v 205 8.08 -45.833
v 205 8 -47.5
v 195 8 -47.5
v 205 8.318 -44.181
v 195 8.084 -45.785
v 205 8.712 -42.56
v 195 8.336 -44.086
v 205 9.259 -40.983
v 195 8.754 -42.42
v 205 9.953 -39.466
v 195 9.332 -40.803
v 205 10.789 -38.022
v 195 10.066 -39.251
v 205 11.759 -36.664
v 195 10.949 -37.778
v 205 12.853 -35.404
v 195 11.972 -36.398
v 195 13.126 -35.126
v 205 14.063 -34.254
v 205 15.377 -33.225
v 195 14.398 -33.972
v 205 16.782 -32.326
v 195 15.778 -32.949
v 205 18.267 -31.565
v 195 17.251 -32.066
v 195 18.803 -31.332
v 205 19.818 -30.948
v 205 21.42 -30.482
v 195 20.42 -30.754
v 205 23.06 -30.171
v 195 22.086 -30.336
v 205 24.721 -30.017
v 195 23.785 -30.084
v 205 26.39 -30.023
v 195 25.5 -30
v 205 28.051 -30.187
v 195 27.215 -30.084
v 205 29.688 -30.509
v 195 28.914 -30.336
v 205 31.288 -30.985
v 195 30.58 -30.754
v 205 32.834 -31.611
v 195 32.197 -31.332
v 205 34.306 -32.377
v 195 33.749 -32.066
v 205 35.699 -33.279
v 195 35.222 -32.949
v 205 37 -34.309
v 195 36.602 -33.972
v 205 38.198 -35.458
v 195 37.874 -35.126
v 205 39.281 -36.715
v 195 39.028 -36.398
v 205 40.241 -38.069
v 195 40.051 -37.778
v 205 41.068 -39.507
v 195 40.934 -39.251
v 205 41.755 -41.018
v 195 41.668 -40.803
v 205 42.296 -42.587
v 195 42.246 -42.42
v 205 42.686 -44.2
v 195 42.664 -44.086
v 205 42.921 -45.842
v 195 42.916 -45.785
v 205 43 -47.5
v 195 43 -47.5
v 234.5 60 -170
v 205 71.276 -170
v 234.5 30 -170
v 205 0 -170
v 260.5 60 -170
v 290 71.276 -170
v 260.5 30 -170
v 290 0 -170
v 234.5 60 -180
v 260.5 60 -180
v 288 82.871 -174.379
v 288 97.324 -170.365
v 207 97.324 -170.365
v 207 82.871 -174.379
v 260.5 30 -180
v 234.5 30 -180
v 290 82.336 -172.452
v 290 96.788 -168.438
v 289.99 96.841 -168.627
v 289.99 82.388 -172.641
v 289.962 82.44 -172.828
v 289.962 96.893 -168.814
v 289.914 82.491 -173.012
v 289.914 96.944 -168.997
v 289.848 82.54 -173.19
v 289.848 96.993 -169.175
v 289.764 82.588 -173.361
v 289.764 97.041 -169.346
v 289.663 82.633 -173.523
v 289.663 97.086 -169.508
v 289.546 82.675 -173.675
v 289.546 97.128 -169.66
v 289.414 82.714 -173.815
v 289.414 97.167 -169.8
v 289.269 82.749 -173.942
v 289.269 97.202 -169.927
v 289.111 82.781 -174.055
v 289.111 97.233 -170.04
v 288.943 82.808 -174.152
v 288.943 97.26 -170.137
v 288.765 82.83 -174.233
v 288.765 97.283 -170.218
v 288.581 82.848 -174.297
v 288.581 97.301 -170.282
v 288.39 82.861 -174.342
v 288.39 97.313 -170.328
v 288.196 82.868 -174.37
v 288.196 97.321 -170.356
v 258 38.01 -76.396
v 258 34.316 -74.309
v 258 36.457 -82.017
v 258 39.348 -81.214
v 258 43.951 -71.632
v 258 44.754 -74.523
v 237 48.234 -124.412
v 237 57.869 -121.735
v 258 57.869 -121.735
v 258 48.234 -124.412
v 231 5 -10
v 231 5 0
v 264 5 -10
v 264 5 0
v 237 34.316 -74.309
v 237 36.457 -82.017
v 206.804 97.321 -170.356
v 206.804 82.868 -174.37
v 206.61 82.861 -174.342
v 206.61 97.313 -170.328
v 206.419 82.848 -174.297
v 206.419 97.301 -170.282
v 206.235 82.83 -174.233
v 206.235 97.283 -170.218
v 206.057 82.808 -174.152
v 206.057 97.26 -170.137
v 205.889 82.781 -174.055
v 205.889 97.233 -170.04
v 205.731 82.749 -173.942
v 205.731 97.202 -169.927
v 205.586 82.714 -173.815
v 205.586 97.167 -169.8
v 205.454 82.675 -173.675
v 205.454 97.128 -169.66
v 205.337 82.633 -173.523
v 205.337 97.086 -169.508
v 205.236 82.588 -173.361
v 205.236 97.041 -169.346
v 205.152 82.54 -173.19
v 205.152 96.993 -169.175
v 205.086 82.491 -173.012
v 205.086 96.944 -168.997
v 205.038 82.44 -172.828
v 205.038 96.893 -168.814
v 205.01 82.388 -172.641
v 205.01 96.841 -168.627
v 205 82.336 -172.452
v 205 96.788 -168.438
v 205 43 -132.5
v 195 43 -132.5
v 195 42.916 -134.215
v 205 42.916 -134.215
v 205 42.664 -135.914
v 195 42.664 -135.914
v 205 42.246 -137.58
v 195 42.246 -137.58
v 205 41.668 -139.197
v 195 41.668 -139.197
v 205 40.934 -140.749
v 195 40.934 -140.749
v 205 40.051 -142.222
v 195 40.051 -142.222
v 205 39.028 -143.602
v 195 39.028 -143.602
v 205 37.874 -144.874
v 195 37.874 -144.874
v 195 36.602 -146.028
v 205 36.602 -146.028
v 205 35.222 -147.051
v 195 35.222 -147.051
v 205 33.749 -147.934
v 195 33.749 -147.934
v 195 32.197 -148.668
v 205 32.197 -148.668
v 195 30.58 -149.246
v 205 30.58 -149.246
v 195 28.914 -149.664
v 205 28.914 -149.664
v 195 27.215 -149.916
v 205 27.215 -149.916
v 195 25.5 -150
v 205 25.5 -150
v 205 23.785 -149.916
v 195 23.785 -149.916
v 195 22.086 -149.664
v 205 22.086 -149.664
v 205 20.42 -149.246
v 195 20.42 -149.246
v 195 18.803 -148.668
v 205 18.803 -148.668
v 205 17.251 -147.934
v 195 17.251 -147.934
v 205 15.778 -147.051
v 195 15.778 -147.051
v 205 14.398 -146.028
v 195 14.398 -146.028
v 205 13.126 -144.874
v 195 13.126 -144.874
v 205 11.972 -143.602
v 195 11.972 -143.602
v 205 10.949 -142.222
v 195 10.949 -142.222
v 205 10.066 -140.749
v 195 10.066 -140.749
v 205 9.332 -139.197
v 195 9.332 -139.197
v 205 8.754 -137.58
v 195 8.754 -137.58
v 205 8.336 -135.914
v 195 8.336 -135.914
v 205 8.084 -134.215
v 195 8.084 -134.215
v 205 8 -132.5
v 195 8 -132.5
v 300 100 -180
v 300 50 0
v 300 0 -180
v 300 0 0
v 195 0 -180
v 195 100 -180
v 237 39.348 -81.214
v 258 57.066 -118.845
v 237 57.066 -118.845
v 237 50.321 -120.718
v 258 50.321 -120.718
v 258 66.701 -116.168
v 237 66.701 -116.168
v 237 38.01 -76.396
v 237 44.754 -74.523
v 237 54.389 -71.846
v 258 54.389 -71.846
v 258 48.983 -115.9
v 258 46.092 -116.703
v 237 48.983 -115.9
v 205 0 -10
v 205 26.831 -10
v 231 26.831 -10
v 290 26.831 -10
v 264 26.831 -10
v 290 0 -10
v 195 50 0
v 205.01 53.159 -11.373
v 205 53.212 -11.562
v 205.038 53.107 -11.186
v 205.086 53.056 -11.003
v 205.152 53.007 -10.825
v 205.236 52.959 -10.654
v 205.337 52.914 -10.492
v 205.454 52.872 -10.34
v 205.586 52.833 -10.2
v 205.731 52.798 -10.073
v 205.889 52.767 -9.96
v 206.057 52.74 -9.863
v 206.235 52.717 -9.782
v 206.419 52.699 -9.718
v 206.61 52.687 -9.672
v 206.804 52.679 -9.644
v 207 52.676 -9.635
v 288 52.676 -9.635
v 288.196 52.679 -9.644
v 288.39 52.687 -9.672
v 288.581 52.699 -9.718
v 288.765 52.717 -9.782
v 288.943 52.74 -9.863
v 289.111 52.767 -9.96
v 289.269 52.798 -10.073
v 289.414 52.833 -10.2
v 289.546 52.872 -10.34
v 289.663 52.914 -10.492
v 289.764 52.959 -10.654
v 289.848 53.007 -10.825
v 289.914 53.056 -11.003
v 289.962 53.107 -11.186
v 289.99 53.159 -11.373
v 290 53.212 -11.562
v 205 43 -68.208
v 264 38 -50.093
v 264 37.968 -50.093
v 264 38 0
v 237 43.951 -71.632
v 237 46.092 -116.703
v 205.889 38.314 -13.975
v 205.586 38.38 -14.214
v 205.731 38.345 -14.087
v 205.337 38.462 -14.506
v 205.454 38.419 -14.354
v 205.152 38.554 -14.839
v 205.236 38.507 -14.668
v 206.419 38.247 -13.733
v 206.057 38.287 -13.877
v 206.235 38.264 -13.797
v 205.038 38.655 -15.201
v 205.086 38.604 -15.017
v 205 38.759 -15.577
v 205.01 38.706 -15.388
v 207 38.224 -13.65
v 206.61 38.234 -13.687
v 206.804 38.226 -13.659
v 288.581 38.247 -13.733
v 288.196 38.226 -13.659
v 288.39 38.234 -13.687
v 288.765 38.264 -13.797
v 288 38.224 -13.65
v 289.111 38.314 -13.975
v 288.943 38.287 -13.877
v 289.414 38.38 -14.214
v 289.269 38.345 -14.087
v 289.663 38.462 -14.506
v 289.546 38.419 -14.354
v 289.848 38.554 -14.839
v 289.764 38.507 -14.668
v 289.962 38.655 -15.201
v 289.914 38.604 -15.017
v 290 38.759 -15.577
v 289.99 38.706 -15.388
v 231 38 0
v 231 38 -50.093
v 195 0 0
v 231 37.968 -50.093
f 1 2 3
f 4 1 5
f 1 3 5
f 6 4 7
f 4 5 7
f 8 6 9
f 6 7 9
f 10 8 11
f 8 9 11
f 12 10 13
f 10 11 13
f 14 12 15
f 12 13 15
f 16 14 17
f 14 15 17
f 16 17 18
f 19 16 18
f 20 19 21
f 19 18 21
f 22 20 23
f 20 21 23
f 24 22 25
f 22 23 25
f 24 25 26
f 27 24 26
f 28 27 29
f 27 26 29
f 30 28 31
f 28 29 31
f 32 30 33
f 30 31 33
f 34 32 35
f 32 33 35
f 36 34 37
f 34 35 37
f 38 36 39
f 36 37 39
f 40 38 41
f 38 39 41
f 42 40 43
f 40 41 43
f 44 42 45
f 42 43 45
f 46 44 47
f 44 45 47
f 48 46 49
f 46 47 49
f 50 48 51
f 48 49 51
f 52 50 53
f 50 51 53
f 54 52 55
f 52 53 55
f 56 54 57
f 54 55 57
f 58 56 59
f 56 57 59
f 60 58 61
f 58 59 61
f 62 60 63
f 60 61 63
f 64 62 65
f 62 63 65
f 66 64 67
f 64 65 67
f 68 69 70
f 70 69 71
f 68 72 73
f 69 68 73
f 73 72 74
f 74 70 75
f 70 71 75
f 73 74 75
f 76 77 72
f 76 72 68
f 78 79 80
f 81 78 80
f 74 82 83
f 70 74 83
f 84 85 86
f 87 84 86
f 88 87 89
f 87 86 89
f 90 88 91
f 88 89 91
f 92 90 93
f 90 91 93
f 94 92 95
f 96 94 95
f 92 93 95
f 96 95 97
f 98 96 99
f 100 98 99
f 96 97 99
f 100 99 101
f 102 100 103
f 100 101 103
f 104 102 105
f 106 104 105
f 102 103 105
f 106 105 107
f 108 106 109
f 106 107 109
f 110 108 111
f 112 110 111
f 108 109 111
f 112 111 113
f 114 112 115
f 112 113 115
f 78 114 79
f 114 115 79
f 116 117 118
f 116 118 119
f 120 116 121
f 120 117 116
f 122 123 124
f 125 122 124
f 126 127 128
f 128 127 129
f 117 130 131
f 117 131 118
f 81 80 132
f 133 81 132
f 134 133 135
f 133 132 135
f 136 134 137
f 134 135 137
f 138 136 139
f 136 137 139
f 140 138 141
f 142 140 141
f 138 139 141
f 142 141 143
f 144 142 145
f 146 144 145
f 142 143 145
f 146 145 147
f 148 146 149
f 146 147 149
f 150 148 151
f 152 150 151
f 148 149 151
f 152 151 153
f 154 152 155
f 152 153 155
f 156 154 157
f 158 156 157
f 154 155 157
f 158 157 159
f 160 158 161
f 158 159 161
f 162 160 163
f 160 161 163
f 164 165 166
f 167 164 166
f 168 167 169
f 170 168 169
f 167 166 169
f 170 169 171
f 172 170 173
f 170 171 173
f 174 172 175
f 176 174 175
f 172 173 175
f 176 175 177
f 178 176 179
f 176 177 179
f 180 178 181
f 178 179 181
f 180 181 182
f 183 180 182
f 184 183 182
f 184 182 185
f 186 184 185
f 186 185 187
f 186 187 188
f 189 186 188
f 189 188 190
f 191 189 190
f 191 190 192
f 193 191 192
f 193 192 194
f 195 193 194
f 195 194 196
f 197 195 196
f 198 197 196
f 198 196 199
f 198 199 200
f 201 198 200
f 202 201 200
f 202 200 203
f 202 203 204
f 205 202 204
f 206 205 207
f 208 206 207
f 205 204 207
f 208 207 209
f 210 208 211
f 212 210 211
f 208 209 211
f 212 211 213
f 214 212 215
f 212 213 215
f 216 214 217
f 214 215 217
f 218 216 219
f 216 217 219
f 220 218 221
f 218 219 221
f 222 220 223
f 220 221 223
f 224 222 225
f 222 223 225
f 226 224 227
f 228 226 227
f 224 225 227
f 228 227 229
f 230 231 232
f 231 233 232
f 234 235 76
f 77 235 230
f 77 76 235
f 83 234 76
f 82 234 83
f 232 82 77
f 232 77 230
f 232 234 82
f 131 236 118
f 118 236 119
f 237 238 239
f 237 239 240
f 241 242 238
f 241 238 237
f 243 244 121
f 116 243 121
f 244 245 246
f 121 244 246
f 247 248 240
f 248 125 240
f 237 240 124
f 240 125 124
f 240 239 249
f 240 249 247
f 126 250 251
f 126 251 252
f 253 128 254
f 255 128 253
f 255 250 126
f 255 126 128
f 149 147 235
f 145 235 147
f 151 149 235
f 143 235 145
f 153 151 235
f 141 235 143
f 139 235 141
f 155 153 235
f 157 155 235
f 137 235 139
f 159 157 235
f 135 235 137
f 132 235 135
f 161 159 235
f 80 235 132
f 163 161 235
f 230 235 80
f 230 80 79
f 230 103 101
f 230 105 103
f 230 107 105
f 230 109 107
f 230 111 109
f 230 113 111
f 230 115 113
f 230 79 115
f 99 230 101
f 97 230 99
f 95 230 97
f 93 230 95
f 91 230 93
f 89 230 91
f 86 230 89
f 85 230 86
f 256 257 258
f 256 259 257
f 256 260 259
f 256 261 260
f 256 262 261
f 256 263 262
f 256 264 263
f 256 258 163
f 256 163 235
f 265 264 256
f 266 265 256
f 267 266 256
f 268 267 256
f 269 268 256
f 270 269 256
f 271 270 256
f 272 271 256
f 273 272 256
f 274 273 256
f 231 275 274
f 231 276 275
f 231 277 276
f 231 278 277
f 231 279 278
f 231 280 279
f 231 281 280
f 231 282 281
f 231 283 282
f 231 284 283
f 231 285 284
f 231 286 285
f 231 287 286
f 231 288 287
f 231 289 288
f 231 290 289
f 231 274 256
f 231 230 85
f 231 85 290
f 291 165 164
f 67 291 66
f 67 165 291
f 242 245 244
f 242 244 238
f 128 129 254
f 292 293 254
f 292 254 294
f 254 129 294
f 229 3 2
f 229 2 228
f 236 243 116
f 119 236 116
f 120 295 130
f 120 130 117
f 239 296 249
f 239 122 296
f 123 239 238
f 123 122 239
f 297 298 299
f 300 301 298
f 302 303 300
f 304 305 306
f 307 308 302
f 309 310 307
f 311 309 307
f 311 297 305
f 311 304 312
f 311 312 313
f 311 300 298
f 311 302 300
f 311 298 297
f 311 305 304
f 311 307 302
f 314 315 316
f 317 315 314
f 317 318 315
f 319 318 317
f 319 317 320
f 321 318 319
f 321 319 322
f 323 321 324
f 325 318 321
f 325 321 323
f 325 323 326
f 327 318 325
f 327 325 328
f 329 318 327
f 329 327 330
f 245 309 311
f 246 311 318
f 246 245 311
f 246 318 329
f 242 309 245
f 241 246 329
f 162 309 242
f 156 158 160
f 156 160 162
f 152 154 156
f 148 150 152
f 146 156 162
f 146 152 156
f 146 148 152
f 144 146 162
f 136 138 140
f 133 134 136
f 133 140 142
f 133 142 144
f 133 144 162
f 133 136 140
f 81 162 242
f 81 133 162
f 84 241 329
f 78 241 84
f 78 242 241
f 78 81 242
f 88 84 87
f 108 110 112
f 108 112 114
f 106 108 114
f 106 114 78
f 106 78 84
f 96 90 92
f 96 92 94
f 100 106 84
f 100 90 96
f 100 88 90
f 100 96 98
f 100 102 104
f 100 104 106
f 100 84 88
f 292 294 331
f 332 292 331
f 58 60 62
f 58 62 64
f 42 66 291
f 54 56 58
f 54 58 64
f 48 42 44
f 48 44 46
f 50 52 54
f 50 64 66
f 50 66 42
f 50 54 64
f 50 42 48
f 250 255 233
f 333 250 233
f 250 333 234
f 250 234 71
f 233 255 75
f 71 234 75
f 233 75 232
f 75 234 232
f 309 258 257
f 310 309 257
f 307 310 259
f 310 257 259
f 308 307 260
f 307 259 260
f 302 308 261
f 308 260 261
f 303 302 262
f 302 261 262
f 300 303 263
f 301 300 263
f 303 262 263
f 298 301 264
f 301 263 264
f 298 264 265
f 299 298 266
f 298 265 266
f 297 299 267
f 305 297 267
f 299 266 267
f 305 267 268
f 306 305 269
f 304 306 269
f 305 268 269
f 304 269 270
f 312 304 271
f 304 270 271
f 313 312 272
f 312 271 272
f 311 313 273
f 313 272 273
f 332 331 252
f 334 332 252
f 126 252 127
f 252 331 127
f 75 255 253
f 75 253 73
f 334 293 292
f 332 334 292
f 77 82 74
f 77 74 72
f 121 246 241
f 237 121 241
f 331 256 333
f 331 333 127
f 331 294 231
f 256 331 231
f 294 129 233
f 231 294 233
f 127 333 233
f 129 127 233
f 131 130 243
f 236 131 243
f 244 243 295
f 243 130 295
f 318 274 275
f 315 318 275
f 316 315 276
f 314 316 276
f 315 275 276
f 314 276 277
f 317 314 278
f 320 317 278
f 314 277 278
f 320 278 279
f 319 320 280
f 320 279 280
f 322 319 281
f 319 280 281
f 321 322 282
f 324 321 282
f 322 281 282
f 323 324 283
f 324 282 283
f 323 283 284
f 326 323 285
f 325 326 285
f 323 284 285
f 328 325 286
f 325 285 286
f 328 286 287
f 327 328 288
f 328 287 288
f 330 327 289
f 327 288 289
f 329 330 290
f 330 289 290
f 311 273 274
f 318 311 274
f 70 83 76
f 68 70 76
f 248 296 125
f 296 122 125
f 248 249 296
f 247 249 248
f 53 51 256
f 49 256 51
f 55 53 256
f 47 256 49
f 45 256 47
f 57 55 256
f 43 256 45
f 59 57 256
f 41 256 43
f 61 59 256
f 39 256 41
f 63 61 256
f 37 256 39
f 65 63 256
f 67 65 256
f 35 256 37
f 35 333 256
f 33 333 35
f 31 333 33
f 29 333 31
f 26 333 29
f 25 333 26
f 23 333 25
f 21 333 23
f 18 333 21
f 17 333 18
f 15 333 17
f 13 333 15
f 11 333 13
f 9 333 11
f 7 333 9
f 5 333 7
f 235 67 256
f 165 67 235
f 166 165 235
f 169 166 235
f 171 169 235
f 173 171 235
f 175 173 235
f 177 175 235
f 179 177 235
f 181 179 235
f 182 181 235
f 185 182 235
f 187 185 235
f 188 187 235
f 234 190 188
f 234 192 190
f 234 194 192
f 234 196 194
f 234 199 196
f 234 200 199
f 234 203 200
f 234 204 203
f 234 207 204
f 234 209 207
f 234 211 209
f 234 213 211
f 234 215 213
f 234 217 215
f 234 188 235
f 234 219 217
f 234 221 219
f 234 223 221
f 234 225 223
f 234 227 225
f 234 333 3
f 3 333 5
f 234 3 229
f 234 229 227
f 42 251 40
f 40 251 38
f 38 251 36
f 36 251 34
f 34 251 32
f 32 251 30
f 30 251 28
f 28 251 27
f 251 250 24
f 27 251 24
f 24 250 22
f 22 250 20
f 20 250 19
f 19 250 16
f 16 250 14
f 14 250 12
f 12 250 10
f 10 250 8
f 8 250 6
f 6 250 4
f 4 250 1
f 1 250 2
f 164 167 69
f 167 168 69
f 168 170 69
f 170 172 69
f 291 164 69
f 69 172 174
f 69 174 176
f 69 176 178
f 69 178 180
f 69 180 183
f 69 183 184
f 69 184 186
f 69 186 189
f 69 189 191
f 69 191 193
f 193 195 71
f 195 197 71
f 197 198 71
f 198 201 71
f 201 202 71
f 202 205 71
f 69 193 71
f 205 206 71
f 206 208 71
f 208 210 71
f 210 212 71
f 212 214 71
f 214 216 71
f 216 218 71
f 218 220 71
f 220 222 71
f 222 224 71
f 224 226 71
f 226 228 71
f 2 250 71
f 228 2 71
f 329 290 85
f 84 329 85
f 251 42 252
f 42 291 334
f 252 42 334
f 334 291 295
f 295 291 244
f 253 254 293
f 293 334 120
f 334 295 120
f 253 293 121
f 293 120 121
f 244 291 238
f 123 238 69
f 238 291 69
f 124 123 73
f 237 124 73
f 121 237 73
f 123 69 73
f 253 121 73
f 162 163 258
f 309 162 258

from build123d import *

# Parameters (mm, degrees)
SKETCH2_W            = 300
SKETCH2_H            = 180
BOSS_EXTRUDE1_DEPTH  = 50
CUT_EXTRUDE1_DEPTH   = 15
BOSS_EXTRUDE4_DEPTH  = 50
SKETCH10_W           = 105
SKETCH10_H           = 180
BOSS_EXTRUDE7_DEPTH  = 50
CUT_EXTRUDE3_DEPTH   = 105
CUT_EXTRUDE4_DEPTH   = 15
SKETCH14_W           = 70
SKETCH14_H           = 65
SKETCH14_W_2         = 95
BOSS_EXTRUDE8_DEPTH  = 35
CUT_EXTRUDE5_DEPTH   = 195
SHELL1_T             = -10
SKETCH16_W           = 21
SKETCH16_H           = 46
CUT_EXTRUDE7_DEPTH   = 10
SKETCH17_R           = 17.5
CUT_EXTRUDE15_DEPTH  = 10
CUT_EXTRUDE16_DEPTH  = 10
SKETCH22_W           = 40.092518347
SKETCH22_H           = 11.168807906
CUT_EXTRUDE17_DEPTH  = 33
SKETCH23_W           = 21
SKETCH23_H           = 10
BOSS_EXTRUDE9_DEPTH  = 3
SKETCH24_W           = 21
SKETCH24_H           = 3
BOSS_EXTRUDE10_DEPTH = 5
CUT_EXTRUDE18_DEPTH  = 10
SKETCH27_W           = 26
SKETCH27_H           = 30
CUT_EXTRUDE19_DEPTH  = 10


with BuildPart() as part:
    # Sketch2 → Boss-Extrude1 (new body)
    with BuildSketch(Plane(origin=(0, 0, 0), x_dir=(1, 0, 0), z_dir=(0, 1, 0))):
        with Locations((150, 90)):
            Rectangle(SKETCH2_W, SKETCH2_H)
    extrude(amount=BOSS_EXTRUDE1_DEPTH)

    # Sketch3 → Cut-Extrude1 (cut)
    with BuildSketch(Plane(origin=(0, 50, 0), x_dir=(1, 0, 0), z_dir=(0, 1, 0))):
        with BuildLine():
            Line((90, 12), (90, 73))
            ThreePointArc((90, 73), (90.585786438, 74.414213562), (92, 75))
            Line((92, 75), (183, 75))
            ThreePointArc((183, 75), (184.414213562, 74.414213562), (185, 73))
            Line((185, 73), (185, 12))
            ThreePointArc((185, 12), (184.414213562, 10.585786438), (183, 10))
            Line((183, 10), (92, 10))
            ThreePointArc((92, 10), (90.585786438, 10.585786438), (90, 12))
        make_face()
        with BuildLine():
            Line((12, 10), (78, 10))
            ThreePointArc((78, 10), (79.414213562, 10.585786438), (80, 12))
            Line((80, 12), (80, 73))
            ThreePointArc((80, 73), (79.414213562, 74.414213562), (78, 75))
            Line((78, 75), (12, 75))
            ThreePointArc((12, 75), (10.585786438, 74.414213562), (10, 73))
            Line((10, 73), (10, 12))
            ThreePointArc((10, 12), (10.585786438, 10.585786438), (12, 10))
        make_face()
    extrude(amount=-CUT_EXTRUDE1_DEPTH, mode=Mode.SUBTRACT)

    # Sketch6 → Boss-Extrude4 (add)
    with BuildSketch(Plane(origin=(0, 50, 0), x_dir=(1, 0, 0), z_dir=(0, 1, 0))):
        Polygon((0, 180), (185, 180), (195, 180), (195, 95), (185, 95), (0, 95), align=None)
        with BuildLine():
            Line((185, 168), (185, 107))
            ThreePointArc((185, 107), (184.414213562, 105.585786438), (183, 105))
            Line((183, 105), (92, 105))
            ThreePointArc((92, 105), (90.585786438, 105.585786438), (90, 107))
            Line((90, 107), (90, 168))
            ThreePointArc((90, 168), (90.585786438, 169.414213562), (92, 170))
            Line((92, 170), (183, 170))
            ThreePointArc((183, 170), (184.414213562, 169.414213562), (185, 168))
        make_face(mode=Mode.SUBTRACT)
        with BuildLine():
            Line((80, 107), (80, 168))
            ThreePointArc((80, 168), (79.414213562, 169.414213562), (78, 170))
            Line((78, 170), (12, 170))
            ThreePointArc((12, 170), (10.585786438, 169.414213562), (10, 168))
            Line((10, 168), (10, 107))
            ThreePointArc((10, 107), (10.585786438, 105.585786438), (12, 105))
            Line((12, 105), (78, 105))
            ThreePointArc((78, 105), (79.414213562, 105.585786438), (80, 107))
        make_face(mode=Mode.SUBTRACT)
    extrude(amount=BOSS_EXTRUDE4_DEPTH)

    # Sketch10 → Boss-Extrude7 (add)
    with BuildSketch(Plane(origin=(0, 50, 0), x_dir=(1, 0, 0), z_dir=(0, 1, 0))):
        with Locations((247.5, 90)):
            Rectangle(SKETCH10_W, SKETCH10_H)
    extrude(amount=BOSS_EXTRUDE7_DEPTH)

    # Sketch11 → Cut-Extrude3 (cut)
    with BuildSketch(Plane(origin=(300, 0, 0), x_dir=(0, 0, -1), z_dir=(1, 0, 0))):
        Polygon((0, 100), (180, 100), (0, 50), align=None)
    extrude(amount=-CUT_EXTRUDE3_DEPTH, mode=Mode.SUBTRACT)

    # Sketch13 → Cut-Extrude4 (cut)
    with BuildSketch(Plane(origin=(0, 46.418338109, 12.893982808), x_dir=(1, 0, 0), z_dir=(0, 0.9635179096299407, 0.2676438637860946))):
        with BuildLine():
            Line((288, 190.197610112), (207, 190.197610112))
            ThreePointArc((207, 190.197610112), (205.585786438, 189.611823674), (205, 188.197610112))
            Line((205, 188.197610112), (205, 25.382193189))
            ThreePointArc((205, 25.382193189), (205.585786438, 23.967979627), (207, 23.382193189))
            Line((207, 23.382193189), (288, 23.382193189))
            ThreePointArc((288, 23.382193189), (289.414213562, 23.967979627), (290, 25.382193189))
            Line((290, 25.382193189), (290, 188.197610112))
            ThreePointArc((290, 188.197610112), (289.414213562, 189.611823674), (288, 190.197610112))
        make_face()
    extrude(amount=-CUT_EXTRUDE4_DEPTH, mode=Mode.SUBTRACT)

    # Sketch14 → Boss-Extrude8 (add)
    with BuildSketch(Plane(origin=(0, 50, 0), x_dir=(1, 0, 0), z_dir=(0, 1, 0))):
        with Locations((45, 137.5)):
            Rectangle(SKETCH14_W, SKETCH14_H)
        with Locations((137.5, 137.5)):
            Rectangle(SKETCH14_W_2, SKETCH14_H)
    extrude(amount=BOSS_EXTRUDE8_DEPTH)

    # Sketch15 → Cut-Extrude5 (cut)
    with BuildSketch(Plane.ZY):
        Polygon((-180, 0), (0, 0), (0, 50), (-95, 50), (-95, 100), (-180, 100), align=None)
    extrude(amount=-CUT_EXTRUDE5_DEPTH, mode=Mode.SUBTRACT)

    # Shell1
    shell1_openings = [part.faces().sort_by_distance(p)[0] for p in [
        (247.5, 0, -90),
    ]]
    offset(amount=SHELL1_T, openings=shell1_openings, kind=Kind.INTERSECTION)

    # Sketch16 → Cut-Extrude7 (cut)
    with BuildSketch(Plane(origin=(0, 31.965569464, 8.879324851), x_dir=(1, 0, 0), z_dir=(0, 0.9635179096299407, 0.2676438637860946))):
        with Locations((247.5, 106.782193189)):
            Rectangle(SKETCH16_W, SKETCH16_H)
    extrude(amount=-CUT_EXTRUDE7_DEPTH, mode=Mode.SUBTRACT)

    # Sketch17 → Cut-Extrude15 (cut)
    with BuildSketch(Plane.ZY.offset(-195)):
        with Locations((-132.5, 25.5)):
            Circle(SKETCH17_R)
        with Locations((-47.5, 25.5)):
            Circle(SKETCH17_R)
    extrude(amount=-CUT_EXTRUDE15_DEPTH, mode=Mode.SUBTRACT)

    # Sketch20 → Cut-Extrude16 (cut)
    with BuildSketch(Plane.XY):
        Polygon((264, 38), (245, 38), (237, 38), (231, 38), (231, 34), (231, 25), (231, 5), (264, 5), align=None)
    extrude(amount=-CUT_EXTRUDE16_DEPTH, mode=Mode.SUBTRACT)

    # Sketch22 → Cut-Extrude17 (cut)
    with BuildSketch(Plane.ZY.offset(-264)):
        with Locations((-30.046259174, 32.415596047)):
            Rectangle(SKETCH22_W, SKETCH22_H)
    extrude(amount=CUT_EXTRUDE17_DEPTH, mode=Mode.SUBTRACT)

    # Sketch23 → Boss-Extrude9 (add)
    with BuildSketch(Plane(origin=(0, 34.735407636, -125.047467489), x_dir=(1, 0, 0), z_dir=(0, -0.2676438637860946, 0.9635179096299407))):
        with Locations((247.5, 18.175895481)):
            Rectangle(SKETCH23_W, SKETCH23_H)
    boss_extrude9 = extrude(amount=-BOSS_EXTRUDE9_DEPTH)

    # Sketch24 → Boss-Extrude10 (add)
    with BuildSketch(Plane(origin=(0, 34.735407636, -125.047467489), x_dir=(1, 0, 0), z_dir=(0, -0.2676438637860946, 0.9635179096299407))):
        with Locations((247.5, 14.675895481)):
            Rectangle(SKETCH24_W, SKETCH24_H)
    boss_extrude10 = extrude(amount=BOSS_EXTRUDE10_DEPTH)

    # Mirror1: Boss-Extrude9, Boss-Extrude10 across plane
    add(boss_extrude9.mirror(Plane(origin=(0, 28.579598769, -102.886555567), x_dir=(1, 0, 0), z_dir=(0, -0.2676438637860946, 0.9635179096299407))))
    add(boss_extrude10.mirror(Plane(origin=(0, 28.579598769, -102.886555567), x_dir=(1, 0, 0), z_dir=(0, -0.2676438637860946, 0.9635179096299407))))

    # Sketch26 → Cut-Extrude18 (cut)
    with BuildSketch(Plane.ZY.offset(-195)):
        with BuildLine():
            Line((-132.5, 43), (-47.5, 43))
            ThreePointArc((-47.5, 43), (-65, 25.5), (-47.5, 8))
            Line((-47.5, 8), (-132.5, 8))
            ThreePointArc((-132.5, 8), (-115, 25.5), (-132.5, 43))
        make_face()
    extrude(amount=-CUT_EXTRUDE18_DEPTH, mode=Mode.SUBTRACT)

    # Sketch27 → Cut-Extrude19 (cut)
    with BuildSketch(Plane(origin=(0, 0, -180), x_dir=(-1, 0, 0), z_dir=(0, 0, -1))):
        with Locations((-247.5, 45)):
            Rectangle(SKETCH27_W, SKETCH27_H)
    extrude(amount=-CUT_EXTRUDE19_DEPTH, mode=Mode.SUBTRACT)


solid = part.part
